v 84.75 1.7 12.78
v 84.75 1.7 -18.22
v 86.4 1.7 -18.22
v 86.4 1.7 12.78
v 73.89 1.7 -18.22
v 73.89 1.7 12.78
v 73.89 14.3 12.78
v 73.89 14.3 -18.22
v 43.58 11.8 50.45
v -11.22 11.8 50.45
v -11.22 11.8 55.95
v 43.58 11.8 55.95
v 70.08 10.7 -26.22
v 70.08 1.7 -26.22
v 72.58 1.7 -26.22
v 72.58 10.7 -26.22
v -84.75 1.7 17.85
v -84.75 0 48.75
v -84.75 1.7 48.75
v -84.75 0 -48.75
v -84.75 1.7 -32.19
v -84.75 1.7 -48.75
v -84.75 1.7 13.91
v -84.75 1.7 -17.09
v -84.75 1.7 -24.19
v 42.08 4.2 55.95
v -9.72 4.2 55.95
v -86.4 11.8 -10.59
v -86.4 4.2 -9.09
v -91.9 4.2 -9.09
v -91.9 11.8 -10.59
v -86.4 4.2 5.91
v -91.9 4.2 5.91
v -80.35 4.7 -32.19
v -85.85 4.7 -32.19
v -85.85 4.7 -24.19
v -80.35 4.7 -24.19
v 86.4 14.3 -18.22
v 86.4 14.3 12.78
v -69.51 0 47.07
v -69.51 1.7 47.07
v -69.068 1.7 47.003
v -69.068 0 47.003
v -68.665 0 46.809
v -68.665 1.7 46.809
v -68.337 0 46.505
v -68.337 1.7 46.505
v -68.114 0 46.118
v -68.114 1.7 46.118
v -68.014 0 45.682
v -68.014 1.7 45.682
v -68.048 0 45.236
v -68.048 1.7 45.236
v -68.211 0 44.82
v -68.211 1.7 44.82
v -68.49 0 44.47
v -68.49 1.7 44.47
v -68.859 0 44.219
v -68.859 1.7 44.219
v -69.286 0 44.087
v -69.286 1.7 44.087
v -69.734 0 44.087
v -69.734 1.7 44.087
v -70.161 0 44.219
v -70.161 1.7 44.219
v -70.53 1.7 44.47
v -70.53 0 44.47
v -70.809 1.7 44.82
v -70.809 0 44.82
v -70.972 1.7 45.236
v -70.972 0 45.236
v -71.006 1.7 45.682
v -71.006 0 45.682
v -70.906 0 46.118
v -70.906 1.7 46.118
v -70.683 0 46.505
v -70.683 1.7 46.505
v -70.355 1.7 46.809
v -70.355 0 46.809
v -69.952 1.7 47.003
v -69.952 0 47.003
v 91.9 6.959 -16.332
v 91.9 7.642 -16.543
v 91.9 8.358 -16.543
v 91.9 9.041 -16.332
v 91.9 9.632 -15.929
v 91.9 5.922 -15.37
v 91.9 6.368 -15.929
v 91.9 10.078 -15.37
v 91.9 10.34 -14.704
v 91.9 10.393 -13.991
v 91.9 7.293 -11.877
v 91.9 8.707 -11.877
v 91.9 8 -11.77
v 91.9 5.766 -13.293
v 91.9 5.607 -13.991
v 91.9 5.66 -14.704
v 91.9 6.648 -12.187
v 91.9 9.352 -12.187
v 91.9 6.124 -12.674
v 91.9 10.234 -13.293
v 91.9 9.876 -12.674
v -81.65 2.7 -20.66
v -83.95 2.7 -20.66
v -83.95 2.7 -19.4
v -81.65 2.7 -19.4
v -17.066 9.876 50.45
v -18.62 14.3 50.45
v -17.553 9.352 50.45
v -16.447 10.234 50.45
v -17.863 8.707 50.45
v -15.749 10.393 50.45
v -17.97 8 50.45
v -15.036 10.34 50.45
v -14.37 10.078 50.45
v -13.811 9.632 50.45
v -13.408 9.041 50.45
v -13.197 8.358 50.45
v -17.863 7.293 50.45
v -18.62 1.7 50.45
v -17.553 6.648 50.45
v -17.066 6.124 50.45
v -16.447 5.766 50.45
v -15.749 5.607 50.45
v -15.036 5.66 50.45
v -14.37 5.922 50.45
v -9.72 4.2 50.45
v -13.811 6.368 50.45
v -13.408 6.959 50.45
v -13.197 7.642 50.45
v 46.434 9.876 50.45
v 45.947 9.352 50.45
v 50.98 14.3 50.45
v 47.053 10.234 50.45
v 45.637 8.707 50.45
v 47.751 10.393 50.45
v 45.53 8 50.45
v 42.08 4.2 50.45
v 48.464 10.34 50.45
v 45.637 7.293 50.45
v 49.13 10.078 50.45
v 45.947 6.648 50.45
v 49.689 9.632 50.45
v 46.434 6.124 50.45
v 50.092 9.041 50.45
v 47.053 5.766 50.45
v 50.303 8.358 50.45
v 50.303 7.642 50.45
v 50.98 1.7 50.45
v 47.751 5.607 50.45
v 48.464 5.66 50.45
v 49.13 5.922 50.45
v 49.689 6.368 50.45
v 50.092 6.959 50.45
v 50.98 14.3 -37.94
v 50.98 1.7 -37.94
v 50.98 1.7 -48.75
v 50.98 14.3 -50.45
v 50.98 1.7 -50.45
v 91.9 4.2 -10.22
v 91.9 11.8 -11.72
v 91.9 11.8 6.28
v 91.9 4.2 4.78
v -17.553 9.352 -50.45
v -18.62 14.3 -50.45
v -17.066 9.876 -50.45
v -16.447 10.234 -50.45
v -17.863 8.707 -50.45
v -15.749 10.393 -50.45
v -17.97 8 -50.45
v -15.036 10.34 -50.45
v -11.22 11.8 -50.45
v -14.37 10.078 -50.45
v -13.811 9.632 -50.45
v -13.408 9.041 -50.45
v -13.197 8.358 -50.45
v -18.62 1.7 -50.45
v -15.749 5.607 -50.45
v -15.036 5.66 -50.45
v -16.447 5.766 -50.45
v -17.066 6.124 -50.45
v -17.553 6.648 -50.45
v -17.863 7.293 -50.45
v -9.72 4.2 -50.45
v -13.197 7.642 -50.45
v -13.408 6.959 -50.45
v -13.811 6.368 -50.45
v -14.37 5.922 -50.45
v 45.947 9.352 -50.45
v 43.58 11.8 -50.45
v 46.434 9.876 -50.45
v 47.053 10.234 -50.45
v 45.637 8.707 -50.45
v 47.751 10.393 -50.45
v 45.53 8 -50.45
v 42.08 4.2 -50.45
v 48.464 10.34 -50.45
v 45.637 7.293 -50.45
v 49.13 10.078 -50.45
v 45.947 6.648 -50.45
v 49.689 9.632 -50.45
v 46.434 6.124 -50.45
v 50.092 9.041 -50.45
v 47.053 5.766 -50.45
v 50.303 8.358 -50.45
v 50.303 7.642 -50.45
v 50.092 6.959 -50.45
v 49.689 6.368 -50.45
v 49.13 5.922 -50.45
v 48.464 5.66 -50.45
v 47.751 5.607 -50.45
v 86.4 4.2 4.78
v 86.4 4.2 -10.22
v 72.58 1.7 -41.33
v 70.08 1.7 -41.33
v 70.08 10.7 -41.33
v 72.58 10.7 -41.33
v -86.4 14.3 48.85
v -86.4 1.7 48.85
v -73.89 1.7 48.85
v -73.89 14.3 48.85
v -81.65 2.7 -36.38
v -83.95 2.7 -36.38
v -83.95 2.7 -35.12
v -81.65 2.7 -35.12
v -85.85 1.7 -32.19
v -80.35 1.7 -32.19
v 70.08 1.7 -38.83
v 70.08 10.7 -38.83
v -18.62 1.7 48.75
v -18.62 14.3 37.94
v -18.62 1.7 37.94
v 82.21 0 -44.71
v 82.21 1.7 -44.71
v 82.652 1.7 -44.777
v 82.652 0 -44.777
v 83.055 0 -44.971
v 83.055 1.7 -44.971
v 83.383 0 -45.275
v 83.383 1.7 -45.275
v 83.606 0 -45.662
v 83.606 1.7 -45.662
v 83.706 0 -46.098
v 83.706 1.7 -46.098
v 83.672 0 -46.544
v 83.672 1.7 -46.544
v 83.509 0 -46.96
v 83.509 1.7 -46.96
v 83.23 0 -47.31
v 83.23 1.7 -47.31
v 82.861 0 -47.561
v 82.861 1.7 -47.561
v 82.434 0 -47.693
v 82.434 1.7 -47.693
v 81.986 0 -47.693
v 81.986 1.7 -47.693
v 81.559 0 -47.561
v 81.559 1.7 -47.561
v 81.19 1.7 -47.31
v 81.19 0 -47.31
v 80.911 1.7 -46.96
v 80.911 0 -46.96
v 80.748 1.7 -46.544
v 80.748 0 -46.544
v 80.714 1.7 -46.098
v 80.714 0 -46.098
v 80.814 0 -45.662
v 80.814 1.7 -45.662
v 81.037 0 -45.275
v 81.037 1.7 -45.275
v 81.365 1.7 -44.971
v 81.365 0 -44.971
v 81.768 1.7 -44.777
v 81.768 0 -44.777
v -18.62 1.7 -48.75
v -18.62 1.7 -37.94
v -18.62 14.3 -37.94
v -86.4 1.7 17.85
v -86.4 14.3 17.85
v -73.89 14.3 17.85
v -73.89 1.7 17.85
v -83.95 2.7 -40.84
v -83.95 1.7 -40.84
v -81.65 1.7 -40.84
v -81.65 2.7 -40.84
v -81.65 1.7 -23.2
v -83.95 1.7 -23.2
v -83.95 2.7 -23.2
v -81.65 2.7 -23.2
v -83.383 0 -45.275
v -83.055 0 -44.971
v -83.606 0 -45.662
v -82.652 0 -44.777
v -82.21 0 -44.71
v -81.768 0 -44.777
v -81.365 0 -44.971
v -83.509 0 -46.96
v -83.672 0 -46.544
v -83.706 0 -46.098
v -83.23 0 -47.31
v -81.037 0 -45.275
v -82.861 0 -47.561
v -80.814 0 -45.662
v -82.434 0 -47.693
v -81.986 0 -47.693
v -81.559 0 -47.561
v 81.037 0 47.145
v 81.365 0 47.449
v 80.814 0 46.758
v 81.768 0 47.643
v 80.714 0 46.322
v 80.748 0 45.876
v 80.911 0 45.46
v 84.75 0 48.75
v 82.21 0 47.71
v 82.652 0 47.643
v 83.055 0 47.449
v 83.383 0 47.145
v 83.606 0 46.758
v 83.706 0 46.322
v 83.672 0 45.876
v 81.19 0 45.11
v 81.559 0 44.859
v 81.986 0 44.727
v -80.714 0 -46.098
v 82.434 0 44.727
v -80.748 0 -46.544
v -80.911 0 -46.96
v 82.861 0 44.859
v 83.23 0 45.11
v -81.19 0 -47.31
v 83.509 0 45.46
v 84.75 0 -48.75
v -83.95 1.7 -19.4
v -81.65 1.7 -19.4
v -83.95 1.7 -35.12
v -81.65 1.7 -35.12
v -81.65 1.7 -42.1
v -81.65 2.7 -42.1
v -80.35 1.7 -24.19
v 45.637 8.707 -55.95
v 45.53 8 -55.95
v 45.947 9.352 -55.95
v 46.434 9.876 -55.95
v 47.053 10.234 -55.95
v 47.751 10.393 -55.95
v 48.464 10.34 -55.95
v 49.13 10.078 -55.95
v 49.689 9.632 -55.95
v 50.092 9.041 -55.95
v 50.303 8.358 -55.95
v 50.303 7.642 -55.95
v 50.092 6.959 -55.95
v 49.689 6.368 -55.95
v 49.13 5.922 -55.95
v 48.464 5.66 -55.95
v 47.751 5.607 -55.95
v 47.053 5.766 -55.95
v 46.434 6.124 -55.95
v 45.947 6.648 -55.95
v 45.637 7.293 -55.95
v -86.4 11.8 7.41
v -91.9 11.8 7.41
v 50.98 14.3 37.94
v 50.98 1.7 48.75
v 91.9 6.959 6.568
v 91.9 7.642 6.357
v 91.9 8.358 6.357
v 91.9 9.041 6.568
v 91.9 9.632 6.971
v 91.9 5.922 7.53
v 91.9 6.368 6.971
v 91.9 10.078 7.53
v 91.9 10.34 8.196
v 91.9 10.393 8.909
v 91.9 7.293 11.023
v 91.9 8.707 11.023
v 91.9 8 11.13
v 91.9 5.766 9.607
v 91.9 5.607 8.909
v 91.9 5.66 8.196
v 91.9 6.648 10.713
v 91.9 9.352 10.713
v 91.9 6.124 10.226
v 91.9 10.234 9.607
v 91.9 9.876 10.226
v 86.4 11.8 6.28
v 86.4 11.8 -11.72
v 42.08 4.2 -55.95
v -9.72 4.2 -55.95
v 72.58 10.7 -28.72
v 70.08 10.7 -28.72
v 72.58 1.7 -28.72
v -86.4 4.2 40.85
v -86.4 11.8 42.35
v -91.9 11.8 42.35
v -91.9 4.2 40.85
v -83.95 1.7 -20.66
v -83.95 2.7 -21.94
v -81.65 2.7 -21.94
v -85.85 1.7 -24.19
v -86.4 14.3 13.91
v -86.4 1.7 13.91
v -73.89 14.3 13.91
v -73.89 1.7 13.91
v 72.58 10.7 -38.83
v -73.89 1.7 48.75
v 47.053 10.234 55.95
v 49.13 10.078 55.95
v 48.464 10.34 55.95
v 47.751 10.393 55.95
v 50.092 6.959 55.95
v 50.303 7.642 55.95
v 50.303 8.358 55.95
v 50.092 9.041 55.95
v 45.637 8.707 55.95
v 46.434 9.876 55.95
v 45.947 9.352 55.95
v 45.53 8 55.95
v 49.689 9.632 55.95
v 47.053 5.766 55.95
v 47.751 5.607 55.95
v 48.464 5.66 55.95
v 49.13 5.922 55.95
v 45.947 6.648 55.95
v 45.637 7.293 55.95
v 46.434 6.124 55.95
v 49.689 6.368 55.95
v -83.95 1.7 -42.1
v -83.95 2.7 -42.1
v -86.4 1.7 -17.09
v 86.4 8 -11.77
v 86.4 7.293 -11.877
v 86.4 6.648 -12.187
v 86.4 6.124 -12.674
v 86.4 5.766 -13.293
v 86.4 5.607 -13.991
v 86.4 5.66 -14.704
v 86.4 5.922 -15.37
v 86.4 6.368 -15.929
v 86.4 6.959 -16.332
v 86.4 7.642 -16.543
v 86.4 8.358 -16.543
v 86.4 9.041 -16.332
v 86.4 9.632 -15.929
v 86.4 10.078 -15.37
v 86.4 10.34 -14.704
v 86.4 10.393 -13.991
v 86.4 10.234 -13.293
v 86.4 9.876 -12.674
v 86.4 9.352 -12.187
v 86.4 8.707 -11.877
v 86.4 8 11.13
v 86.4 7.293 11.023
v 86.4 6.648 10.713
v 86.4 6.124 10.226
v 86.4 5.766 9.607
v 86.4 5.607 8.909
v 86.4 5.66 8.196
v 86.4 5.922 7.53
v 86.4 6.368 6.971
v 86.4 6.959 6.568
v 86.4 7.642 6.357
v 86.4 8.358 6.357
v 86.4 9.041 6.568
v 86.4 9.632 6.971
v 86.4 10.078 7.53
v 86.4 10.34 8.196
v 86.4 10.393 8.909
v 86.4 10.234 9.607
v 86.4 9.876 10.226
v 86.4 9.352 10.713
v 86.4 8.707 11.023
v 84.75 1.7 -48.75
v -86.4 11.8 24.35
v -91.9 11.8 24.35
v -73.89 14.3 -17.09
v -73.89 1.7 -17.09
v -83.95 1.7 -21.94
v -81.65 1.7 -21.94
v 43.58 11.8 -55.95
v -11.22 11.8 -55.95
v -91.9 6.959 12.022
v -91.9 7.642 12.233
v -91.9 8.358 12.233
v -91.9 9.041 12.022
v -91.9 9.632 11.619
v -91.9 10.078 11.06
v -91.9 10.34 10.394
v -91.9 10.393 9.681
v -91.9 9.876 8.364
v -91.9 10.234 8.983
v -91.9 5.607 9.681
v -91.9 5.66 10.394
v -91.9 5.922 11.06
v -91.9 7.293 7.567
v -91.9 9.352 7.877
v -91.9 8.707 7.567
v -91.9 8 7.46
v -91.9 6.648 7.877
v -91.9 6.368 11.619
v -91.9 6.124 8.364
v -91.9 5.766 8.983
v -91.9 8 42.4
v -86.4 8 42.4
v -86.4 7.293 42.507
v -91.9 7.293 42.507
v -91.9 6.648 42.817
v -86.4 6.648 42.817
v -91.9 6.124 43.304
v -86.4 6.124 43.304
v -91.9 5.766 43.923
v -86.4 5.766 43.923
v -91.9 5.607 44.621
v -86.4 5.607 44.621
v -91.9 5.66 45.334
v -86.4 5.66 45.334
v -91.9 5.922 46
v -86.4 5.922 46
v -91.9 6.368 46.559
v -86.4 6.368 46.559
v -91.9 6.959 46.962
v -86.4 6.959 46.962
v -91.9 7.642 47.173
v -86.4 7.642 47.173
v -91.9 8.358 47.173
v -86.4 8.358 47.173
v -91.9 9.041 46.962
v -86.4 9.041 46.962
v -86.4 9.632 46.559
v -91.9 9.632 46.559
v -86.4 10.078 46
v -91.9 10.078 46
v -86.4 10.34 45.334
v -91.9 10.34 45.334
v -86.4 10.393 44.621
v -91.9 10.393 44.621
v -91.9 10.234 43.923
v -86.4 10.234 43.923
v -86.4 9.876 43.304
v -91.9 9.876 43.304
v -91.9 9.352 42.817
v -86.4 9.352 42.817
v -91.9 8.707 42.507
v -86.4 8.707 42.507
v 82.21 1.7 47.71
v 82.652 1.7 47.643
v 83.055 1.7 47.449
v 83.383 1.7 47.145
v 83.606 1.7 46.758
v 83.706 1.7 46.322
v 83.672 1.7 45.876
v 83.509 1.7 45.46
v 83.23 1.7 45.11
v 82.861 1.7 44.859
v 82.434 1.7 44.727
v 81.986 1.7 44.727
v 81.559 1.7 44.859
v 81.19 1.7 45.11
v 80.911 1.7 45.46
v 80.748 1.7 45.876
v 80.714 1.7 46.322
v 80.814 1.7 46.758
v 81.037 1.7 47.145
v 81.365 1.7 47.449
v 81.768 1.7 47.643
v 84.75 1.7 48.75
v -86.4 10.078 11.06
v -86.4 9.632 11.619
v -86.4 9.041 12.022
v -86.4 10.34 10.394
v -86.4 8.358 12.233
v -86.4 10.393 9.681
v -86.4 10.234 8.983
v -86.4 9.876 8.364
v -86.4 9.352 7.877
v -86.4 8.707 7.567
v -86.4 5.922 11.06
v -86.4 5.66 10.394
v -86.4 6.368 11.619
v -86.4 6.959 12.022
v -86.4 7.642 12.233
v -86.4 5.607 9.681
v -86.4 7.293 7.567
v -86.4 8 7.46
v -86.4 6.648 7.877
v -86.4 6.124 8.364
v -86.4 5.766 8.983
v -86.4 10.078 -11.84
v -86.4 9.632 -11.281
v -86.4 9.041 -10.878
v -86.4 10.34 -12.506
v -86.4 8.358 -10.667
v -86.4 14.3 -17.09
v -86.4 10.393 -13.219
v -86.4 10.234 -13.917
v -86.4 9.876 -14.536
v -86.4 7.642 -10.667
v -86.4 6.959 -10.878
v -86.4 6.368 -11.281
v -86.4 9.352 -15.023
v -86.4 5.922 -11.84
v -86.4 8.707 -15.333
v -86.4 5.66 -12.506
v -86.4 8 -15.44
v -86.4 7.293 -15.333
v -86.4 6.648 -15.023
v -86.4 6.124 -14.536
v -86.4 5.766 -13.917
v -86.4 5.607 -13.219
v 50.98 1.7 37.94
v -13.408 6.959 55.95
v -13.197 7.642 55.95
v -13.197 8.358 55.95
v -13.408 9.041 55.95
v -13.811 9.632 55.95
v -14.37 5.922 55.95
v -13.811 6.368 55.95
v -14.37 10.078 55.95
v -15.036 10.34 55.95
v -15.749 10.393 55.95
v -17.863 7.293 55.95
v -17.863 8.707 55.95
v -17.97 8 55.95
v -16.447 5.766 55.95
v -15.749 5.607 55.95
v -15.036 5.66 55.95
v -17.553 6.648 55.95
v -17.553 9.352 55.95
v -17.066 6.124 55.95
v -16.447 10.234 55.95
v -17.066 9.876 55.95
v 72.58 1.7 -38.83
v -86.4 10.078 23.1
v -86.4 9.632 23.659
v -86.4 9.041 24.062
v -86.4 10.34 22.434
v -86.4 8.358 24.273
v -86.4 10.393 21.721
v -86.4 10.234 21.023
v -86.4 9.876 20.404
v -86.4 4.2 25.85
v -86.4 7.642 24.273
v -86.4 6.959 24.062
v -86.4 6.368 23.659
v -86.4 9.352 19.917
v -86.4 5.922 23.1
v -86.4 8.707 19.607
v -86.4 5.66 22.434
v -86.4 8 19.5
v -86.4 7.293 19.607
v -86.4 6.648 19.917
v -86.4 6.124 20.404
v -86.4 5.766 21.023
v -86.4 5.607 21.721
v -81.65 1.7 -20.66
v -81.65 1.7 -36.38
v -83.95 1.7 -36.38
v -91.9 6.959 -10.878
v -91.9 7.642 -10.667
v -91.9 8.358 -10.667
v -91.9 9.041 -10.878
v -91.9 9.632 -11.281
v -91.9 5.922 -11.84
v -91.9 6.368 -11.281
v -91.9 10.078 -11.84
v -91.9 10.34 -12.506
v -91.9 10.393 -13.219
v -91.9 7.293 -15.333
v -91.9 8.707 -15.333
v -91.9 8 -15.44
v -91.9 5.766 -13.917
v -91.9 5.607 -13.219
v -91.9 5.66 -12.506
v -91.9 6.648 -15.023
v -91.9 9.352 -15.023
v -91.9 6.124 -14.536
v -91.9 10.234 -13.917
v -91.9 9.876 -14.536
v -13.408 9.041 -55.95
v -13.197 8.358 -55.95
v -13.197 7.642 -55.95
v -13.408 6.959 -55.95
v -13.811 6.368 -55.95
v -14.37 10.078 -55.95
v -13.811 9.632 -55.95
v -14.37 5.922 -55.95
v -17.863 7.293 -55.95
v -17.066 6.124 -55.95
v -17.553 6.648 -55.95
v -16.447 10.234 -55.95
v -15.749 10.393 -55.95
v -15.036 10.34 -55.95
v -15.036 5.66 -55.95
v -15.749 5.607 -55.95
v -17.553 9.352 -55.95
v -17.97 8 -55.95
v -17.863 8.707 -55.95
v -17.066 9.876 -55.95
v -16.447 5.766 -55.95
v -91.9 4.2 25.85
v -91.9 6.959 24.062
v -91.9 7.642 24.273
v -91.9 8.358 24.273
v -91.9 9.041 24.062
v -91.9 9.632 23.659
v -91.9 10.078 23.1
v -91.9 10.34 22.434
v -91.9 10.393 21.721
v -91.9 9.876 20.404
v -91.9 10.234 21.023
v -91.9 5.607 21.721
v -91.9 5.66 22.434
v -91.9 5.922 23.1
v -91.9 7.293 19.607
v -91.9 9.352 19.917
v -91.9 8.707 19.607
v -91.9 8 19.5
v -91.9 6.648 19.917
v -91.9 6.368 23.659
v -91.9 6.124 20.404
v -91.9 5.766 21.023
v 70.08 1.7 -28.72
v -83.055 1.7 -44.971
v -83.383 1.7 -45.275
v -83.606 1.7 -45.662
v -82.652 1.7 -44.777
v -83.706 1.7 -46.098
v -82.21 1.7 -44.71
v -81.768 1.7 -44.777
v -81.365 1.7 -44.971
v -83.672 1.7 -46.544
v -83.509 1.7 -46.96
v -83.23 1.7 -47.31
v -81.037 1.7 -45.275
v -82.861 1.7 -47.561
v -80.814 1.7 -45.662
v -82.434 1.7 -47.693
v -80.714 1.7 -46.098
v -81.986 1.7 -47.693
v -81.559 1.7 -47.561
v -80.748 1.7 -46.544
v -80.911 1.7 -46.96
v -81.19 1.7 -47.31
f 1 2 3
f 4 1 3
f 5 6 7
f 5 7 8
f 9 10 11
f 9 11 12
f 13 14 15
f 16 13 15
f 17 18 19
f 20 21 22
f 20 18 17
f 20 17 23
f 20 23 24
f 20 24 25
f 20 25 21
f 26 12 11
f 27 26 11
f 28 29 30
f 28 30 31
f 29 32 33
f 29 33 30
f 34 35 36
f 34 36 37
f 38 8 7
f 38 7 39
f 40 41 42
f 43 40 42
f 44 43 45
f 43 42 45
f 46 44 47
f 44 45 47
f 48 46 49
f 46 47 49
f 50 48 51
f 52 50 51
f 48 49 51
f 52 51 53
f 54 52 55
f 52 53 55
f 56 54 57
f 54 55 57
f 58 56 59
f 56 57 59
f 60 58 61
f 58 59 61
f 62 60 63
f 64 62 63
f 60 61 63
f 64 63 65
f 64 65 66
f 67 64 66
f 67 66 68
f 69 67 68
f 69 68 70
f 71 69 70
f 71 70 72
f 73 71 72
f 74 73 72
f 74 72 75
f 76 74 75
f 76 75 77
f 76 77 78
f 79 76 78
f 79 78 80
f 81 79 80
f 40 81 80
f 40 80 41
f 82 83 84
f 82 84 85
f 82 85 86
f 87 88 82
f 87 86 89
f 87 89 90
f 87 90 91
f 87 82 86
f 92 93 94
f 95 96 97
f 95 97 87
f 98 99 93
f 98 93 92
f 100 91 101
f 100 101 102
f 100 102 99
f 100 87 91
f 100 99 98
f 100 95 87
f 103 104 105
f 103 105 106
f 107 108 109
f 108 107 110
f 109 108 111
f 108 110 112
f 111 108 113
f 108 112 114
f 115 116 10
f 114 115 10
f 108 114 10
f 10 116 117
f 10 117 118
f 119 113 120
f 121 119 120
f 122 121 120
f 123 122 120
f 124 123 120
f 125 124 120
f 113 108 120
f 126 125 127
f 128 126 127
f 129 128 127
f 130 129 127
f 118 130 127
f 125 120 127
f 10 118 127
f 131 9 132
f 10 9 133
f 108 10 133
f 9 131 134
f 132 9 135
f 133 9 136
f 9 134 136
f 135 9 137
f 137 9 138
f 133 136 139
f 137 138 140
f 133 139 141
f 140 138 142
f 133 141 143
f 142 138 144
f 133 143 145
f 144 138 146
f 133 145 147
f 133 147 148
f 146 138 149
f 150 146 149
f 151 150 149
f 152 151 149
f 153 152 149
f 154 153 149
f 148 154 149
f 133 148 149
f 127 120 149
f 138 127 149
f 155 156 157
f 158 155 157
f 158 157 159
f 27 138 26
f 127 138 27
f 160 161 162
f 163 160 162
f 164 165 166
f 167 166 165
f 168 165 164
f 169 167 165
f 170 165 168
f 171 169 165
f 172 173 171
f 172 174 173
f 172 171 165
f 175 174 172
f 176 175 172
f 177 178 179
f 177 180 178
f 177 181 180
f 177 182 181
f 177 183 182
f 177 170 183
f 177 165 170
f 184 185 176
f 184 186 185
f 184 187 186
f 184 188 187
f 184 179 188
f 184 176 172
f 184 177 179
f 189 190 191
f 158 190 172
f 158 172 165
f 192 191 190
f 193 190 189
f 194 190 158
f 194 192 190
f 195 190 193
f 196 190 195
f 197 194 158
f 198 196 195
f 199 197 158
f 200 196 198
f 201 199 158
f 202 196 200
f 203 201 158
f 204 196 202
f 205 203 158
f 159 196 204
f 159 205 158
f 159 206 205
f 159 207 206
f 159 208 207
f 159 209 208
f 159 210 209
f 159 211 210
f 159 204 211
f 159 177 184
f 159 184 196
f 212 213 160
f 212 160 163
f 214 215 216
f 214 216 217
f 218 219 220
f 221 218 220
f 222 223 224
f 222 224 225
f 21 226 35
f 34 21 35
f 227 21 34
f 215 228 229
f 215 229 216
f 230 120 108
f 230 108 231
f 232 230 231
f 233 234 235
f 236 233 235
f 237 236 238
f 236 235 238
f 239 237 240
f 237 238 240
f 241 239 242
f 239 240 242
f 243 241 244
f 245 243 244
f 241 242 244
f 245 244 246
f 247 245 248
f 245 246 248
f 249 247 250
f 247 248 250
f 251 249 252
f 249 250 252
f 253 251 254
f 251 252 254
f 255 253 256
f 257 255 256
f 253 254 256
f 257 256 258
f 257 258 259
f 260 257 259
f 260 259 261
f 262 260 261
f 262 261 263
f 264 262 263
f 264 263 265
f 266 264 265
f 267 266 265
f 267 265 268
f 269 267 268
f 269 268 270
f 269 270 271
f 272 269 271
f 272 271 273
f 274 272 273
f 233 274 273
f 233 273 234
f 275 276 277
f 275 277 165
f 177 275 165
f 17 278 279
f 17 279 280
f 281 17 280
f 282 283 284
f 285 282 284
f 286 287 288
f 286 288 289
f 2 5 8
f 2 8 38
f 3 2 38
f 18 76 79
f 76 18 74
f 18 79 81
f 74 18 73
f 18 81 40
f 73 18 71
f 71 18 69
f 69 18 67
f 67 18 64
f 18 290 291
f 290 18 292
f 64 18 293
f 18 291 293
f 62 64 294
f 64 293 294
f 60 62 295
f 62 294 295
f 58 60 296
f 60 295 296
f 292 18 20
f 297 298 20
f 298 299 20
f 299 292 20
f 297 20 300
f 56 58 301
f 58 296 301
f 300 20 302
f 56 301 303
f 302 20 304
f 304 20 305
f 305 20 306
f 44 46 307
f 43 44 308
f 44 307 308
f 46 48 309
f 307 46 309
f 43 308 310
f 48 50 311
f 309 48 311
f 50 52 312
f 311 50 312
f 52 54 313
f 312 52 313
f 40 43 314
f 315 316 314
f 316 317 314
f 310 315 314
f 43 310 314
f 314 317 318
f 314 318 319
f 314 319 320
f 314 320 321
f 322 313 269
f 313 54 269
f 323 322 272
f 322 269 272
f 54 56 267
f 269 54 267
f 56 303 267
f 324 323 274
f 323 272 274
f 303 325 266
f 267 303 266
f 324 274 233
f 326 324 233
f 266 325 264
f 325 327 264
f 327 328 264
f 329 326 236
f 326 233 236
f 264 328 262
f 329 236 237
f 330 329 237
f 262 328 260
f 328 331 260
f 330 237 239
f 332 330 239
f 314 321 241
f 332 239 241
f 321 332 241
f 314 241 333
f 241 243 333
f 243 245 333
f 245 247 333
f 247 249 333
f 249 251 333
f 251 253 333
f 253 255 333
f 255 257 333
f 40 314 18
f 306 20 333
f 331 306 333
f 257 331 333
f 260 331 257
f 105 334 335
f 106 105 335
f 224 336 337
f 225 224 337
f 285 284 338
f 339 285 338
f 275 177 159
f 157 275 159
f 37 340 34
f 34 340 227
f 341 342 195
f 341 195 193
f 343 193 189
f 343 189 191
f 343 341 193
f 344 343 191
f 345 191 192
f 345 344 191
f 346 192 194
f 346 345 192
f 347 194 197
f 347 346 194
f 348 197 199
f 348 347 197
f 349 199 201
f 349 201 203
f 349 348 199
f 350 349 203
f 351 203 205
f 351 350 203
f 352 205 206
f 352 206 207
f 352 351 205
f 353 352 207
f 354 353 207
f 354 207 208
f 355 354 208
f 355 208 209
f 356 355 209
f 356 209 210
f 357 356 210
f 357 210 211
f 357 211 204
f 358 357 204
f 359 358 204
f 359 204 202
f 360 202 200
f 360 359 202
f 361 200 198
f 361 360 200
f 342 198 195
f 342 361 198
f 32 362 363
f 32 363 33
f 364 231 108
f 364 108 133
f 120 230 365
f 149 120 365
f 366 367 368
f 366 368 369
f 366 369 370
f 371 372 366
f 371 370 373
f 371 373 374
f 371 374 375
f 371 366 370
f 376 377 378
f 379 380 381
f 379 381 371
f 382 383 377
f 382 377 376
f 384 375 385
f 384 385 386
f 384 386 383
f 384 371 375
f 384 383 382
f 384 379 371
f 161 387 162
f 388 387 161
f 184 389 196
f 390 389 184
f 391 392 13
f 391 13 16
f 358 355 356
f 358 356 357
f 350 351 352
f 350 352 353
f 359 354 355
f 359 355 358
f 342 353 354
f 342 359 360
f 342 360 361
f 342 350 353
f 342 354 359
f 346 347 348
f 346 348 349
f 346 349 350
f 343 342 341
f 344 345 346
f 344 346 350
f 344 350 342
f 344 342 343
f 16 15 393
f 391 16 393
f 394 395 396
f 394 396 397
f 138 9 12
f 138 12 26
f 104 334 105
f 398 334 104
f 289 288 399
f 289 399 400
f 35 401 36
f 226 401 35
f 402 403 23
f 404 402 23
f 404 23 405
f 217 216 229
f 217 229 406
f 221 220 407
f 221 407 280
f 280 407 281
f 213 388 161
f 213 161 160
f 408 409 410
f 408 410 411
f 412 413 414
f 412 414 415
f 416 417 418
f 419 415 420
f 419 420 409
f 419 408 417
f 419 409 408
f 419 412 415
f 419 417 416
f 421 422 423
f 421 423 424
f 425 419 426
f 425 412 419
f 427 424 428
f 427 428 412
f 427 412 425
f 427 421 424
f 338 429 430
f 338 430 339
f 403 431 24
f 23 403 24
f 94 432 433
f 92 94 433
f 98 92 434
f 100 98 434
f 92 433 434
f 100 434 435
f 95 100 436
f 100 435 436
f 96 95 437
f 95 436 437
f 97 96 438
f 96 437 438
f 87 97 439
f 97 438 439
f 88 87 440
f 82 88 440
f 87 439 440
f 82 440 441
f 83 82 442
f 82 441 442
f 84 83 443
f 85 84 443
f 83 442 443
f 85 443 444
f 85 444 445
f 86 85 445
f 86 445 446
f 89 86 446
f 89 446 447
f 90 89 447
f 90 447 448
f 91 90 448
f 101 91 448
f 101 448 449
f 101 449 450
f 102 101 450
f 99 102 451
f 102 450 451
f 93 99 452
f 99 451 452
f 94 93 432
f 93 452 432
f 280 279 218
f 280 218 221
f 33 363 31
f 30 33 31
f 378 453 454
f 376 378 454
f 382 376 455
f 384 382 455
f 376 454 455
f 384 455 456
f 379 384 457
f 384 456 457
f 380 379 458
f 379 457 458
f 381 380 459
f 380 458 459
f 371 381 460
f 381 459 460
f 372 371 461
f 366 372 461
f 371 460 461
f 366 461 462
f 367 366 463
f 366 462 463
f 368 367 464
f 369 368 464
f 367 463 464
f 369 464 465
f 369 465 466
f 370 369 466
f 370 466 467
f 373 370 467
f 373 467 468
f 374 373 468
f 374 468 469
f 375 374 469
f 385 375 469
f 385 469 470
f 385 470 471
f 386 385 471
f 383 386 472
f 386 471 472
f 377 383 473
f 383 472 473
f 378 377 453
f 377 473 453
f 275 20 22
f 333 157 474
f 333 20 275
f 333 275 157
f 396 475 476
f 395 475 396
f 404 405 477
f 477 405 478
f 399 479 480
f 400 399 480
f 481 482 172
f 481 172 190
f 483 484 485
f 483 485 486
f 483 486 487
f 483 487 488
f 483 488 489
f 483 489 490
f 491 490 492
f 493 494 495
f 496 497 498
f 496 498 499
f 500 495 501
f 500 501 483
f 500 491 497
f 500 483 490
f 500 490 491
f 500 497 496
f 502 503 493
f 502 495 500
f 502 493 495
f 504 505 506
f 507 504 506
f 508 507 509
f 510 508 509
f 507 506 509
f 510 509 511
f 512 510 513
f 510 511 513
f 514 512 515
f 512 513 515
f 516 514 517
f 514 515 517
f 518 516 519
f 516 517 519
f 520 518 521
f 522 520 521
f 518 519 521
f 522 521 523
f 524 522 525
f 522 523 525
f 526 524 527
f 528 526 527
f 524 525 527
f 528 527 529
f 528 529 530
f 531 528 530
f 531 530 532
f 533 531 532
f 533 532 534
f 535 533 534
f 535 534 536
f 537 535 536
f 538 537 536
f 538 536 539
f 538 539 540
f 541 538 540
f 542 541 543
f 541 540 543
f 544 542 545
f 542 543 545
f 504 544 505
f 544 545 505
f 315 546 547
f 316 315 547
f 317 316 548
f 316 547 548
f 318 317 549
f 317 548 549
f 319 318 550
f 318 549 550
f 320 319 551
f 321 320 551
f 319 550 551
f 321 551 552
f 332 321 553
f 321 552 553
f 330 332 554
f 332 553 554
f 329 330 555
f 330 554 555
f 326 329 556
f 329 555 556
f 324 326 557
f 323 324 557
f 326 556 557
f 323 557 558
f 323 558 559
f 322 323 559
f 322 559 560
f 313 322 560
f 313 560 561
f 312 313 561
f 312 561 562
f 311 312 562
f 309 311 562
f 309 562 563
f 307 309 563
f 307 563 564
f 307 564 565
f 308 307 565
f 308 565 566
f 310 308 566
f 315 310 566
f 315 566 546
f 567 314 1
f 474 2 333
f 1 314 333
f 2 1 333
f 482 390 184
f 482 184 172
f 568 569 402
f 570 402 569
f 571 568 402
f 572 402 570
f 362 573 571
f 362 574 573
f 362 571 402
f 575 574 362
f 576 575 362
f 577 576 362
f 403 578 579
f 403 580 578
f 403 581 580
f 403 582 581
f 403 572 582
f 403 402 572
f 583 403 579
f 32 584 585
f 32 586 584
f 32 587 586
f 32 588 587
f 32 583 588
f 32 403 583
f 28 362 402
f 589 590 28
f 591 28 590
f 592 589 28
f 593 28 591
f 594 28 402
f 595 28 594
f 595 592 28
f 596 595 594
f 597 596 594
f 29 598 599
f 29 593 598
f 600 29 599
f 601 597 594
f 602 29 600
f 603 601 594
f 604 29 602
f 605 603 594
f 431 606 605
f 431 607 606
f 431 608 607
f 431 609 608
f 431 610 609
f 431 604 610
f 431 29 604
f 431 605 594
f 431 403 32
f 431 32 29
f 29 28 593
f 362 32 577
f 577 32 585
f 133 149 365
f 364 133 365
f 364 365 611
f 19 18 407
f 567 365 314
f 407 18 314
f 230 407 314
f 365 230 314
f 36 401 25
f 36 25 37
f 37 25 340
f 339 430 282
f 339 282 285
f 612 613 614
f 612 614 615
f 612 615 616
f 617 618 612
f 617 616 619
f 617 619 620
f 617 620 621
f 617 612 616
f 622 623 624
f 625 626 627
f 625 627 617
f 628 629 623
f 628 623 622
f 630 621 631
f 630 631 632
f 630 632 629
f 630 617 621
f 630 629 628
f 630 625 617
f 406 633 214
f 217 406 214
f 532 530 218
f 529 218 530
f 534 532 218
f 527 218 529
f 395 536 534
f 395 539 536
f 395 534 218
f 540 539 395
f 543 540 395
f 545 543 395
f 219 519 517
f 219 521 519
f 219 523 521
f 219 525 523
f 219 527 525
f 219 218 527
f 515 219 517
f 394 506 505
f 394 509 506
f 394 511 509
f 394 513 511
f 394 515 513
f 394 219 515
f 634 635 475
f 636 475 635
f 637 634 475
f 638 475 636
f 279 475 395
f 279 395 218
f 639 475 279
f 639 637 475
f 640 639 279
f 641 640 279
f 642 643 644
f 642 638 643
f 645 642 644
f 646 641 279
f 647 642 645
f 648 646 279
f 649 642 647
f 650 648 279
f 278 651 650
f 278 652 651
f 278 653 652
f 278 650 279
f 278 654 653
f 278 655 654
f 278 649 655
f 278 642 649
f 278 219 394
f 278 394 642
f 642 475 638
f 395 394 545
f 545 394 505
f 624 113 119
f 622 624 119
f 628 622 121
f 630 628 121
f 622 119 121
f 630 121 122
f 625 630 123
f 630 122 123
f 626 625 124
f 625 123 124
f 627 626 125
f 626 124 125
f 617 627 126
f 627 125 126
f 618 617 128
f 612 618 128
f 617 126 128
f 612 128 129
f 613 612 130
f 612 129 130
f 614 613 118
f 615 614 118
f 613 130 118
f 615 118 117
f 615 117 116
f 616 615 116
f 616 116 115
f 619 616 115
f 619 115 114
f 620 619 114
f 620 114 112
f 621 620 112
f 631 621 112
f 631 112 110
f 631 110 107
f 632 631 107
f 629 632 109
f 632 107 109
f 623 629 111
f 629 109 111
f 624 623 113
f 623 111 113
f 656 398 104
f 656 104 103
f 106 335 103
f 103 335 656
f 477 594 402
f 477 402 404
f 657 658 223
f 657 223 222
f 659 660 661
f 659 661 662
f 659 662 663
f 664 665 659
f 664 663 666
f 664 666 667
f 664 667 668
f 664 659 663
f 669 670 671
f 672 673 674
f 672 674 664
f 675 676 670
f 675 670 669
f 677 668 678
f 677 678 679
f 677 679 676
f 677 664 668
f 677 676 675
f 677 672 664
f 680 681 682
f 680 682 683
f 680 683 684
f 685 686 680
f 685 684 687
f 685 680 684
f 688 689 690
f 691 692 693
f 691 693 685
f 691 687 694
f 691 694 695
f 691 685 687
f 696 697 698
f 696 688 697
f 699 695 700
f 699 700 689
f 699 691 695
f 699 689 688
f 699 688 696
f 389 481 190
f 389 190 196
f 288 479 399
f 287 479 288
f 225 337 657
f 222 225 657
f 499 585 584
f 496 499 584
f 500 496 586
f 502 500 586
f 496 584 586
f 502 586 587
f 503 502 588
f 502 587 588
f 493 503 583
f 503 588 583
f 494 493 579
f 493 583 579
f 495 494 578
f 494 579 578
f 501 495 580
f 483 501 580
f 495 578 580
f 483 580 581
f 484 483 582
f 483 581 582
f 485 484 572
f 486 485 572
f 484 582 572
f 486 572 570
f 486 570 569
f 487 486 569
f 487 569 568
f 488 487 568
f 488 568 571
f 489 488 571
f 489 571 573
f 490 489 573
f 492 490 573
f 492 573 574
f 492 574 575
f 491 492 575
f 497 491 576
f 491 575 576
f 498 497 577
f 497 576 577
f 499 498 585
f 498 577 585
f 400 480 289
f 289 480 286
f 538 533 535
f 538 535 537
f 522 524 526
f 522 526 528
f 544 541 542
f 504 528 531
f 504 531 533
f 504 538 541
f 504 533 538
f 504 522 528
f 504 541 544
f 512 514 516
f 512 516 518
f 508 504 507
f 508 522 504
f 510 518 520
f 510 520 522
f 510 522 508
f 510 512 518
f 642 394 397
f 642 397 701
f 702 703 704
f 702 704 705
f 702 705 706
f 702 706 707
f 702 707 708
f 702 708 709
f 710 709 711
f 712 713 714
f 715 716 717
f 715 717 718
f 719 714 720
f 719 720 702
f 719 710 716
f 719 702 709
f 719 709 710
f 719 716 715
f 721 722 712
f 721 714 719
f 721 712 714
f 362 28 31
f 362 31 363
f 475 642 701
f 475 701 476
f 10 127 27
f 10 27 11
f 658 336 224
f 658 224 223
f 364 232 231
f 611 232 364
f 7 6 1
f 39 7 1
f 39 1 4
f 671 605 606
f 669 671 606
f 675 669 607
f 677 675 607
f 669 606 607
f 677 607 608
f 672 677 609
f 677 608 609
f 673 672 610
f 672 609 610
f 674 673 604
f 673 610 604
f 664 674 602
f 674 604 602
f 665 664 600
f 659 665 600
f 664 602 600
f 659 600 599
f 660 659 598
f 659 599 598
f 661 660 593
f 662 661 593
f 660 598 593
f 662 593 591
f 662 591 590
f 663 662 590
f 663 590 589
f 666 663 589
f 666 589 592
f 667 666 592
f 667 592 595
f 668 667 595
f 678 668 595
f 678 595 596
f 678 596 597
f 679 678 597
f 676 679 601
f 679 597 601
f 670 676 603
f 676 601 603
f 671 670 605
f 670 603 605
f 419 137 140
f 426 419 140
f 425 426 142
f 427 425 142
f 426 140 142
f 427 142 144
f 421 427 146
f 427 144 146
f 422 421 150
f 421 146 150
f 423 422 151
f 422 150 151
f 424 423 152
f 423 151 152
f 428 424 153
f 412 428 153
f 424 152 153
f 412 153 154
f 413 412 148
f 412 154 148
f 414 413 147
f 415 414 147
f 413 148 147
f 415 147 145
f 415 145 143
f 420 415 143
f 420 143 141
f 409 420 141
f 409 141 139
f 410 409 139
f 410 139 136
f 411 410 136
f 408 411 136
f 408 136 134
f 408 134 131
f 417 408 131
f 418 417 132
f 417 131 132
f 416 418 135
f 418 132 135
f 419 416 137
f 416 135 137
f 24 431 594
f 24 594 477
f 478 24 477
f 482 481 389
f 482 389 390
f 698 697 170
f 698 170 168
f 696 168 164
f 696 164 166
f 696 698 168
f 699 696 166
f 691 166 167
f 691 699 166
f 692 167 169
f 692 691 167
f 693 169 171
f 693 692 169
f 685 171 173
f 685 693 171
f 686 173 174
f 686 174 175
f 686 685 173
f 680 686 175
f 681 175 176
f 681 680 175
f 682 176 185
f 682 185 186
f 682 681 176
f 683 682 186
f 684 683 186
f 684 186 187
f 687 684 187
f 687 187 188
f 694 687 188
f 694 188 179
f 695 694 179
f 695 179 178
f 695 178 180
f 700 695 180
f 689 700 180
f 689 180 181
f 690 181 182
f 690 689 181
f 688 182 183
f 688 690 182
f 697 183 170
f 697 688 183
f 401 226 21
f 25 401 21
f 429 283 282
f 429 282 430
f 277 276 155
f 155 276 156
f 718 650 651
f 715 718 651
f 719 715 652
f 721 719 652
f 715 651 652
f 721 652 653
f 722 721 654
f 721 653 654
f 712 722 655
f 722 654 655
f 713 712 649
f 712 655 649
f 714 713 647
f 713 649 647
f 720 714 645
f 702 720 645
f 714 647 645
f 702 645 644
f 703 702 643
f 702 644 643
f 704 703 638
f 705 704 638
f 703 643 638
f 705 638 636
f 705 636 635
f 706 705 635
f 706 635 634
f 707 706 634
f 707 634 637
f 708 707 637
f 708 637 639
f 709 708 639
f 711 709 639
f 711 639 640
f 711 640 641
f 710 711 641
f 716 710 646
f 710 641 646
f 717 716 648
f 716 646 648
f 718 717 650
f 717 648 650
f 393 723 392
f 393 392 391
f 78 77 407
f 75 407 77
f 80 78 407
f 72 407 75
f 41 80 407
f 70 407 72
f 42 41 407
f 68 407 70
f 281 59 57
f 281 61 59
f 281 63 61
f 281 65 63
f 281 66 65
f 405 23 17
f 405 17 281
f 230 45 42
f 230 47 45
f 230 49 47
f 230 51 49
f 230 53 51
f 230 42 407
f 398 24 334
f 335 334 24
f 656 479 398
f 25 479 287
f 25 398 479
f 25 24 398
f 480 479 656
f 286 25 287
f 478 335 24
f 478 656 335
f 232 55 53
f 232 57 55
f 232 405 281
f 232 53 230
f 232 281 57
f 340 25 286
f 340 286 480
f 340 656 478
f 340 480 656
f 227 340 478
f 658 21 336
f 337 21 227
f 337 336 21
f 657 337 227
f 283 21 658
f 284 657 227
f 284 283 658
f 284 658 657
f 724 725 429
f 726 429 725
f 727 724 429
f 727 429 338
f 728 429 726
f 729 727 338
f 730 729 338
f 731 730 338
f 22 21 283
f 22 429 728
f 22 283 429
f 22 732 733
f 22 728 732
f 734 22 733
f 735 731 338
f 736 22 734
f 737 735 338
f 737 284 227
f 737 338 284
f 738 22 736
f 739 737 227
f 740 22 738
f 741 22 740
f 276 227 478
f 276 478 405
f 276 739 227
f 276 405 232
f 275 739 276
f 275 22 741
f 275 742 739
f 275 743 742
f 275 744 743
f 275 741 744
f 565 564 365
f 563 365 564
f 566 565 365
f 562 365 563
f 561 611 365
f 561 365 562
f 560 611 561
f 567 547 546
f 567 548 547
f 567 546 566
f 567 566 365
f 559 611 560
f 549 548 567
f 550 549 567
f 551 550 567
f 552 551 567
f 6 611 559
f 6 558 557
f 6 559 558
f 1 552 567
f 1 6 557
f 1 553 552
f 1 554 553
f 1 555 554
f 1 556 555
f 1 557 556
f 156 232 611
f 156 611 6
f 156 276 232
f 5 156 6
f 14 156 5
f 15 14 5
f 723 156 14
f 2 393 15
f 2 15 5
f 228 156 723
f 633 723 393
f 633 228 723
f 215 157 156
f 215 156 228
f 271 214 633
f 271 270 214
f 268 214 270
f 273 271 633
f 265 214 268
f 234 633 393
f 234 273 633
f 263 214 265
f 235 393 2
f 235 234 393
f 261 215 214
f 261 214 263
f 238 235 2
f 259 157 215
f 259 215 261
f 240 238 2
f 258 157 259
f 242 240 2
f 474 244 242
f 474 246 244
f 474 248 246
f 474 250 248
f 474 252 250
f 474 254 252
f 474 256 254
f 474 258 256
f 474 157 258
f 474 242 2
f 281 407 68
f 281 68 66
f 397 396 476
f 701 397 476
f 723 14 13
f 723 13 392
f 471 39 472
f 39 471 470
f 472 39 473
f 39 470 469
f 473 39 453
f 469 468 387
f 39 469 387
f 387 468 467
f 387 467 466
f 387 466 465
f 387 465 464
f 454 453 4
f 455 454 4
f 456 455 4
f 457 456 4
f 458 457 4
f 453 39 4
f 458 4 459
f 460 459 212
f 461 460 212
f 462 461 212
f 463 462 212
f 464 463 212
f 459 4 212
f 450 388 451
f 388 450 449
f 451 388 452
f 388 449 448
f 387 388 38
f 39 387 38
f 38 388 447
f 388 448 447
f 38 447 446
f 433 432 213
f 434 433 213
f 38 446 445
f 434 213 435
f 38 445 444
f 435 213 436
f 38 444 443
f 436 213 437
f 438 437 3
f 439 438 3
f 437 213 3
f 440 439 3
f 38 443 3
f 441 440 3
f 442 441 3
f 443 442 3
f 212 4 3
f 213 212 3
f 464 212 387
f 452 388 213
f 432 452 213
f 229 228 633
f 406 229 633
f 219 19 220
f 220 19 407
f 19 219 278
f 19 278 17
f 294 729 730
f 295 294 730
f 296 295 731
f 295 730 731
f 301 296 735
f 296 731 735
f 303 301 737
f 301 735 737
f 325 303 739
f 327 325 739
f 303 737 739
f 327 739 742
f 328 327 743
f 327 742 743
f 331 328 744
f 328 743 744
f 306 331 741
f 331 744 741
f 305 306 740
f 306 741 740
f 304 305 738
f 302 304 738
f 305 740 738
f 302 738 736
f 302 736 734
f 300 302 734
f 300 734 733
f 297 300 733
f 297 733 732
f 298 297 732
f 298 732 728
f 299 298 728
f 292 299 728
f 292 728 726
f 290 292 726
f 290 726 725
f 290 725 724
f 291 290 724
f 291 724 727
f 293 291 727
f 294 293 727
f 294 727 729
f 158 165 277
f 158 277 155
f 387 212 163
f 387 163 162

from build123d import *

# Parameters (mm, degrees)
SKETCH1_W           = 169.5
SKETCH1_H           = 97.5
BASE_DEPTH          = 1.7
MOUNTHOLES_REACH    = 99.786
SKETCH2_R           = 1.5
SKETCH3_W           = 12.51
SKETCH3_H           = 31
SKETCH3_W_2         = 69.6
SKETCH3_H_2         = 12.51
DSUBMAIN_DEPTH      = 12.6
SKETCH4_R           = 2.4
BOSS_EXTRUDE3_DEPTH = 5.5
SKETCH5_R           = 2.4
BOSS_EXTRUDE4_DEPTH = 5.5
SKETCH6_R           = 2.4
BOSS_EXTRUDE5_DEPTH = 5.5
BOSS_EXTRUDE6_START = 5.5
SKETCH7_R           = 2.4
BOSS_EXTRUDE6_DEPTH = 5.5
SKETCH8_W           = 5.5
SKETCH8_H           = 8
USB_DEPTH           = 3
SKETCH9_W           = 2.3
SKETCH9_H           = 1.26
LED_DEPTH           = 1
SKETCH10_W          = 2.5
SKETCH10_H          = 2.5
BOSS_EXTRUDE9_DEPTH = 9


with BuildPart() as part:
    # Sketch1 → Base (new body)
    with BuildSketch(Plane(origin=(0, 0, 0), x_dir=(1, 0, 0), z_dir=(0, 1, 0))):
        Rectangle(SKETCH1_W, SKETCH1_H)
    extrude(amount=BASE_DEPTH)

    # Sketch2 → MountHoles (cut, up to next)
    with BuildSketch(Plane(origin=(0, 1.7, 0), x_dir=(1, 0, 0), z_dir=(0, 1, 0)), mode=Mode.PRIVATE) as mountholes_sk1:
        with Locations((82.21, 46.21)):
            Circle(SKETCH2_R)
    mountholes_tool1 = extrude(mountholes_sk1.sketch, amount=-MOUNTHOLES_REACH, mode=Mode.PRIVATE) & part.part
    # Sketch2 → MountHoles (cut, up to next)
    with BuildSketch(Plane(origin=(0, 1.7, 0), x_dir=(1, 0, 0), z_dir=(0, 1, 0)), mode=Mode.PRIVATE) as mountholes_sk2:
        with Locations((82.21, -46.21)):
            Circle(SKETCH2_R)
    mountholes_tool2 = extrude(mountholes_sk2.sketch, amount=-MOUNTHOLES_REACH, mode=Mode.PRIVATE) & part.part
    # Sketch2 → MountHoles (cut, up to next)
    with BuildSketch(Plane(origin=(0, 1.7, 0), x_dir=(1, 0, 0), z_dir=(0, 1, 0)), mode=Mode.PRIVATE) as mountholes_sk3:
        with Locations((-69.51, -45.57)):
            Circle(SKETCH2_R)
    mountholes_tool3 = extrude(mountholes_sk3.sketch, amount=-MOUNTHOLES_REACH, mode=Mode.PRIVATE) & part.part
    # Sketch2 → MountHoles (cut, up to next)
    with BuildSketch(Plane(origin=(0, 1.7, 0), x_dir=(1, 0, 0), z_dir=(0, 1, 0)), mode=Mode.PRIVATE) as mountholes_sk4:
        with Locations((-82.21, 46.21)):
            Circle(SKETCH2_R)
    mountholes_tool4 = extrude(mountholes_sk4.sketch, amount=-MOUNTHOLES_REACH, mode=Mode.PRIVATE) & part.part
    add(mountholes_tool1.solids().sort_by_distance((82.21, 1.7, -46.21))[0], mode=Mode.SUBTRACT)
    add(mountholes_tool2.solids().sort_by_distance((82.21, 1.7, 46.21))[0], mode=Mode.SUBTRACT)
    add(mountholes_tool3.solids().sort_by_distance((-69.51, 1.7, 45.57))[0], mode=Mode.SUBTRACT)
    add(mountholes_tool4.solids().sort_by_distance((-82.21, 1.7, -46.21))[0], mode=Mode.SUBTRACT)

    # Sketch3 → DSUBMain (add)
    with BuildSketch(Plane(origin=(0, 1.7, 0), x_dir=(1, 0, 0), z_dir=(0, 1, 0))):
        with Locations((-80.145, 1.59)):
            Rectangle(SKETCH3_W, SKETCH3_H)
        with Locations((-80.145, -33.35)):
            Rectangle(SKETCH3_W, SKETCH3_H)
        with Locations((80.145, 2.72)):
            Rectangle(SKETCH3_W, SKETCH3_H)
        with Locations((16.18, 44.195)):
            Rectangle(SKETCH3_W_2, SKETCH3_H_2)
        with Locations((16.18, -44.195)):
            Rectangle(SKETCH3_W_2, SKETCH3_H_2)
    extrude(amount=DSUBMAIN_DEPTH)

    # Sketch4 → Boss-Extrude3 (add)
    with BuildSketch(Plane(origin=(86.4, 0, 0), x_dir=(0, 0, -1), z_dir=(1, 0, 0))):
        with Locations((-8.73, 8)):
            Circle(SKETCH4_R)
        with Locations((14.17, 8)):
            Circle(SKETCH4_R)
        Polygon((-6.28, 11.8), (11.72, 11.8), (10.22, 4.2), (-4.78, 4.2), align=None)
    extrude(amount=BOSS_EXTRUDE3_DEPTH)

    # Sketch5 → Boss-Extrude4 (add)
    with BuildSketch(Plane.ZY.offset(86.4)):
        with Locations((-13.04, 8)):
            Circle(SKETCH5_R)
        with Locations((9.86, 8)):
            Circle(SKETCH5_R)
        with Locations((21.9, 8)):
            Circle(SKETCH5_R)
        with Locations((44.8, 8)):
            Circle(SKETCH5_R)
        Polygon((-10.59, 11.8), (7.41, 11.8), (5.91, 4.2), (-9.09, 4.2), align=None)
        Polygon((24.35, 11.8), (42.35, 11.8), (40.85, 4.2), (25.85, 4.2), align=None)
    extrude(amount=BOSS_EXTRUDE4_DEPTH)

    # Sketch6 → Boss-Extrude5 (add)
    with BuildSketch(Plane.XY.offset(50.45)):
        with Locations((-15.57, 8)):
            Circle(SKETCH6_R)
        with Locations((47.93, 8)):
            Circle(SKETCH6_R)
        Polygon((-11.22, 11.8), (43.58, 11.8), (42.08, 4.2), (-9.72, 4.2), align=None)
    extrude(amount=BOSS_EXTRUDE5_DEPTH)

    # Sketch7 → Boss-Extrude6 (add)
    with BuildSketch(Plane(origin=(0, 0, -50.45), x_dir=(-1, 0, 0), z_dir=(0, 0, -1)).offset(BOSS_EXTRUDE6_START)):
        with Locations((-47.93, 8)):
            Circle(SKETCH7_R)
        with Locations((15.57, 8)):
            Circle(SKETCH7_R)
        Polygon((11.22, 11.8), (-43.58, 11.8), (-42.08, 4.2), (9.72, 4.2), align=None)
    extrude(amount=-BOSS_EXTRUDE6_DEPTH)

    # Sketch8 → USB (add)
    with BuildSketch(Plane(origin=(0, 1.7, 0), x_dir=(1, 0, 0), z_dir=(0, 1, 0))):
        with Locations((-83.1, 28.19)):
            Rectangle(SKETCH8_W, SKETCH8_H)
    extrude(amount=USB_DEPTH)

    # Sketch9 → LED (add)
    with BuildSketch(Plane(origin=(0, 1.7, 0), x_dir=(1, 0, 0), z_dir=(0, 1, 0))):
        with Locations((-82.8, 41.47)):
            Rectangle(SKETCH9_W, SKETCH9_H)
        with Locations((-82.8, 35.75)):
            Rectangle(SKETCH9_W, SKETCH9_H)
        with Locations((-82.8, 22.57)):
            Rectangle(SKETCH9_W, SKETCH9_H)
        with Locations((-82.8, 20.03)):
            Rectangle(SKETCH9_W, SKETCH9_H)
    extrude(amount=LED_DEPTH)

    # Sketch10 → Boss-Extrude9 (add)
    with BuildSketch(Plane(origin=(0, 1.7, 0), x_dir=(1, 0, 0), z_dir=(0, 1, 0))):
        with Locations((71.33, 40.08)):
            Rectangle(SKETCH10_W, SKETCH10_H)
        with Locations((71.33, 27.47)):
            Rectangle(SKETCH10_W, SKETCH10_H)
    extrude(amount=BOSS_EXTRUDE9_DEPTH)


solid = part.part
